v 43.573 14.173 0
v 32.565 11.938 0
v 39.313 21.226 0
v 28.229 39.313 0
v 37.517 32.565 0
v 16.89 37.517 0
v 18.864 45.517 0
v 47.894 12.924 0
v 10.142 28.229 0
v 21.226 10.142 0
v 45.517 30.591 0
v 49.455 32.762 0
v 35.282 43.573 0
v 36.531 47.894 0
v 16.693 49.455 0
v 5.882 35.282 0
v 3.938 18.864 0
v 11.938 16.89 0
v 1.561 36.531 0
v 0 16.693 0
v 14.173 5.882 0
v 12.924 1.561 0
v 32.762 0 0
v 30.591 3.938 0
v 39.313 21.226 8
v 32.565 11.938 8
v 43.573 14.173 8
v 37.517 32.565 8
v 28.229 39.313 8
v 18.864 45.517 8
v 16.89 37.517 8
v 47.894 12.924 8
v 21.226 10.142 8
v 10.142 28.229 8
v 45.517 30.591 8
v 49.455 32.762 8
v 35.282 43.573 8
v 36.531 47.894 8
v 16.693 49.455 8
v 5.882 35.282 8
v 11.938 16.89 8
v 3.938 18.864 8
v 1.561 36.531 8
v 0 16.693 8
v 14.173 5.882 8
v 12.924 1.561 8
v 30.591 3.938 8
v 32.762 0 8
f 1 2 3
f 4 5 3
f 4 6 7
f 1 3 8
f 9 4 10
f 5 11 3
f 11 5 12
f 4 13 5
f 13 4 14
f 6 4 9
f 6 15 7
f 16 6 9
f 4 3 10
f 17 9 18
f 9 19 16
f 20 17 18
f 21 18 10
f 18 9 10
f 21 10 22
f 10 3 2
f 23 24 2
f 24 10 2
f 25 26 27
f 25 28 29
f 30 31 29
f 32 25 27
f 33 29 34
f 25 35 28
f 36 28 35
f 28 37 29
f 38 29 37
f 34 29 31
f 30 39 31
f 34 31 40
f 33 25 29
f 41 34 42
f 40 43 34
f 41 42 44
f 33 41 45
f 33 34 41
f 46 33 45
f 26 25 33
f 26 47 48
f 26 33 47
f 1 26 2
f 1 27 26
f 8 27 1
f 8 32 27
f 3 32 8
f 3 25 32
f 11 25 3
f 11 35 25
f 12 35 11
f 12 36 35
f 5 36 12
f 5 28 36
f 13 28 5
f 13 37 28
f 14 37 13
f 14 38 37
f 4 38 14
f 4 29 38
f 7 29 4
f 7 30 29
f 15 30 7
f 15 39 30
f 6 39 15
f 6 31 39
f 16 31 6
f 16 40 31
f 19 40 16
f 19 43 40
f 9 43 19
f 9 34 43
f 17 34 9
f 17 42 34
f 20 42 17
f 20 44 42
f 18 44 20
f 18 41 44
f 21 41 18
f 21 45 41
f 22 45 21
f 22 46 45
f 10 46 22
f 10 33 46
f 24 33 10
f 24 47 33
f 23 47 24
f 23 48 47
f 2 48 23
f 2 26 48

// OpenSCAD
$fn = 32;

// ----------------------------------------------------------------------
// Fan rotor section: 8 blades, 15 mm hub radius, 11 mm blades
// ----------------------------------------------------------------------

// --- parameters (mm) ---
profile_height = 8;       // extrusion height
profile_points = 24;      // points of the closed outline

profile = [[39.313, 21.226], [45.517, 30.591], [49.455, 32.762], [37.517, 32.565], [35.282, 43.573], [36.531, 47.894], [28.229, 39.313], [18.864, 45.517], [16.693, 49.455], [16.89, 37.517], [5.882, 35.282], [1.561, 36.531], [10.142, 28.229], [3.938, 18.864], [0, 16.693], [11.938, 16.89], [14.173, 5.882], [12.924, 1.561], [21.226, 10.142], [30.591, 3.938], [32.762, 0], [32.565, 11.938], [43.573, 14.173], [47.894, 12.924]];  // single closed polygon, 24 points, counter clockwise

// --- the one profile operation ---
linear_extrude(height = profile_height) polygon(points = profile);
